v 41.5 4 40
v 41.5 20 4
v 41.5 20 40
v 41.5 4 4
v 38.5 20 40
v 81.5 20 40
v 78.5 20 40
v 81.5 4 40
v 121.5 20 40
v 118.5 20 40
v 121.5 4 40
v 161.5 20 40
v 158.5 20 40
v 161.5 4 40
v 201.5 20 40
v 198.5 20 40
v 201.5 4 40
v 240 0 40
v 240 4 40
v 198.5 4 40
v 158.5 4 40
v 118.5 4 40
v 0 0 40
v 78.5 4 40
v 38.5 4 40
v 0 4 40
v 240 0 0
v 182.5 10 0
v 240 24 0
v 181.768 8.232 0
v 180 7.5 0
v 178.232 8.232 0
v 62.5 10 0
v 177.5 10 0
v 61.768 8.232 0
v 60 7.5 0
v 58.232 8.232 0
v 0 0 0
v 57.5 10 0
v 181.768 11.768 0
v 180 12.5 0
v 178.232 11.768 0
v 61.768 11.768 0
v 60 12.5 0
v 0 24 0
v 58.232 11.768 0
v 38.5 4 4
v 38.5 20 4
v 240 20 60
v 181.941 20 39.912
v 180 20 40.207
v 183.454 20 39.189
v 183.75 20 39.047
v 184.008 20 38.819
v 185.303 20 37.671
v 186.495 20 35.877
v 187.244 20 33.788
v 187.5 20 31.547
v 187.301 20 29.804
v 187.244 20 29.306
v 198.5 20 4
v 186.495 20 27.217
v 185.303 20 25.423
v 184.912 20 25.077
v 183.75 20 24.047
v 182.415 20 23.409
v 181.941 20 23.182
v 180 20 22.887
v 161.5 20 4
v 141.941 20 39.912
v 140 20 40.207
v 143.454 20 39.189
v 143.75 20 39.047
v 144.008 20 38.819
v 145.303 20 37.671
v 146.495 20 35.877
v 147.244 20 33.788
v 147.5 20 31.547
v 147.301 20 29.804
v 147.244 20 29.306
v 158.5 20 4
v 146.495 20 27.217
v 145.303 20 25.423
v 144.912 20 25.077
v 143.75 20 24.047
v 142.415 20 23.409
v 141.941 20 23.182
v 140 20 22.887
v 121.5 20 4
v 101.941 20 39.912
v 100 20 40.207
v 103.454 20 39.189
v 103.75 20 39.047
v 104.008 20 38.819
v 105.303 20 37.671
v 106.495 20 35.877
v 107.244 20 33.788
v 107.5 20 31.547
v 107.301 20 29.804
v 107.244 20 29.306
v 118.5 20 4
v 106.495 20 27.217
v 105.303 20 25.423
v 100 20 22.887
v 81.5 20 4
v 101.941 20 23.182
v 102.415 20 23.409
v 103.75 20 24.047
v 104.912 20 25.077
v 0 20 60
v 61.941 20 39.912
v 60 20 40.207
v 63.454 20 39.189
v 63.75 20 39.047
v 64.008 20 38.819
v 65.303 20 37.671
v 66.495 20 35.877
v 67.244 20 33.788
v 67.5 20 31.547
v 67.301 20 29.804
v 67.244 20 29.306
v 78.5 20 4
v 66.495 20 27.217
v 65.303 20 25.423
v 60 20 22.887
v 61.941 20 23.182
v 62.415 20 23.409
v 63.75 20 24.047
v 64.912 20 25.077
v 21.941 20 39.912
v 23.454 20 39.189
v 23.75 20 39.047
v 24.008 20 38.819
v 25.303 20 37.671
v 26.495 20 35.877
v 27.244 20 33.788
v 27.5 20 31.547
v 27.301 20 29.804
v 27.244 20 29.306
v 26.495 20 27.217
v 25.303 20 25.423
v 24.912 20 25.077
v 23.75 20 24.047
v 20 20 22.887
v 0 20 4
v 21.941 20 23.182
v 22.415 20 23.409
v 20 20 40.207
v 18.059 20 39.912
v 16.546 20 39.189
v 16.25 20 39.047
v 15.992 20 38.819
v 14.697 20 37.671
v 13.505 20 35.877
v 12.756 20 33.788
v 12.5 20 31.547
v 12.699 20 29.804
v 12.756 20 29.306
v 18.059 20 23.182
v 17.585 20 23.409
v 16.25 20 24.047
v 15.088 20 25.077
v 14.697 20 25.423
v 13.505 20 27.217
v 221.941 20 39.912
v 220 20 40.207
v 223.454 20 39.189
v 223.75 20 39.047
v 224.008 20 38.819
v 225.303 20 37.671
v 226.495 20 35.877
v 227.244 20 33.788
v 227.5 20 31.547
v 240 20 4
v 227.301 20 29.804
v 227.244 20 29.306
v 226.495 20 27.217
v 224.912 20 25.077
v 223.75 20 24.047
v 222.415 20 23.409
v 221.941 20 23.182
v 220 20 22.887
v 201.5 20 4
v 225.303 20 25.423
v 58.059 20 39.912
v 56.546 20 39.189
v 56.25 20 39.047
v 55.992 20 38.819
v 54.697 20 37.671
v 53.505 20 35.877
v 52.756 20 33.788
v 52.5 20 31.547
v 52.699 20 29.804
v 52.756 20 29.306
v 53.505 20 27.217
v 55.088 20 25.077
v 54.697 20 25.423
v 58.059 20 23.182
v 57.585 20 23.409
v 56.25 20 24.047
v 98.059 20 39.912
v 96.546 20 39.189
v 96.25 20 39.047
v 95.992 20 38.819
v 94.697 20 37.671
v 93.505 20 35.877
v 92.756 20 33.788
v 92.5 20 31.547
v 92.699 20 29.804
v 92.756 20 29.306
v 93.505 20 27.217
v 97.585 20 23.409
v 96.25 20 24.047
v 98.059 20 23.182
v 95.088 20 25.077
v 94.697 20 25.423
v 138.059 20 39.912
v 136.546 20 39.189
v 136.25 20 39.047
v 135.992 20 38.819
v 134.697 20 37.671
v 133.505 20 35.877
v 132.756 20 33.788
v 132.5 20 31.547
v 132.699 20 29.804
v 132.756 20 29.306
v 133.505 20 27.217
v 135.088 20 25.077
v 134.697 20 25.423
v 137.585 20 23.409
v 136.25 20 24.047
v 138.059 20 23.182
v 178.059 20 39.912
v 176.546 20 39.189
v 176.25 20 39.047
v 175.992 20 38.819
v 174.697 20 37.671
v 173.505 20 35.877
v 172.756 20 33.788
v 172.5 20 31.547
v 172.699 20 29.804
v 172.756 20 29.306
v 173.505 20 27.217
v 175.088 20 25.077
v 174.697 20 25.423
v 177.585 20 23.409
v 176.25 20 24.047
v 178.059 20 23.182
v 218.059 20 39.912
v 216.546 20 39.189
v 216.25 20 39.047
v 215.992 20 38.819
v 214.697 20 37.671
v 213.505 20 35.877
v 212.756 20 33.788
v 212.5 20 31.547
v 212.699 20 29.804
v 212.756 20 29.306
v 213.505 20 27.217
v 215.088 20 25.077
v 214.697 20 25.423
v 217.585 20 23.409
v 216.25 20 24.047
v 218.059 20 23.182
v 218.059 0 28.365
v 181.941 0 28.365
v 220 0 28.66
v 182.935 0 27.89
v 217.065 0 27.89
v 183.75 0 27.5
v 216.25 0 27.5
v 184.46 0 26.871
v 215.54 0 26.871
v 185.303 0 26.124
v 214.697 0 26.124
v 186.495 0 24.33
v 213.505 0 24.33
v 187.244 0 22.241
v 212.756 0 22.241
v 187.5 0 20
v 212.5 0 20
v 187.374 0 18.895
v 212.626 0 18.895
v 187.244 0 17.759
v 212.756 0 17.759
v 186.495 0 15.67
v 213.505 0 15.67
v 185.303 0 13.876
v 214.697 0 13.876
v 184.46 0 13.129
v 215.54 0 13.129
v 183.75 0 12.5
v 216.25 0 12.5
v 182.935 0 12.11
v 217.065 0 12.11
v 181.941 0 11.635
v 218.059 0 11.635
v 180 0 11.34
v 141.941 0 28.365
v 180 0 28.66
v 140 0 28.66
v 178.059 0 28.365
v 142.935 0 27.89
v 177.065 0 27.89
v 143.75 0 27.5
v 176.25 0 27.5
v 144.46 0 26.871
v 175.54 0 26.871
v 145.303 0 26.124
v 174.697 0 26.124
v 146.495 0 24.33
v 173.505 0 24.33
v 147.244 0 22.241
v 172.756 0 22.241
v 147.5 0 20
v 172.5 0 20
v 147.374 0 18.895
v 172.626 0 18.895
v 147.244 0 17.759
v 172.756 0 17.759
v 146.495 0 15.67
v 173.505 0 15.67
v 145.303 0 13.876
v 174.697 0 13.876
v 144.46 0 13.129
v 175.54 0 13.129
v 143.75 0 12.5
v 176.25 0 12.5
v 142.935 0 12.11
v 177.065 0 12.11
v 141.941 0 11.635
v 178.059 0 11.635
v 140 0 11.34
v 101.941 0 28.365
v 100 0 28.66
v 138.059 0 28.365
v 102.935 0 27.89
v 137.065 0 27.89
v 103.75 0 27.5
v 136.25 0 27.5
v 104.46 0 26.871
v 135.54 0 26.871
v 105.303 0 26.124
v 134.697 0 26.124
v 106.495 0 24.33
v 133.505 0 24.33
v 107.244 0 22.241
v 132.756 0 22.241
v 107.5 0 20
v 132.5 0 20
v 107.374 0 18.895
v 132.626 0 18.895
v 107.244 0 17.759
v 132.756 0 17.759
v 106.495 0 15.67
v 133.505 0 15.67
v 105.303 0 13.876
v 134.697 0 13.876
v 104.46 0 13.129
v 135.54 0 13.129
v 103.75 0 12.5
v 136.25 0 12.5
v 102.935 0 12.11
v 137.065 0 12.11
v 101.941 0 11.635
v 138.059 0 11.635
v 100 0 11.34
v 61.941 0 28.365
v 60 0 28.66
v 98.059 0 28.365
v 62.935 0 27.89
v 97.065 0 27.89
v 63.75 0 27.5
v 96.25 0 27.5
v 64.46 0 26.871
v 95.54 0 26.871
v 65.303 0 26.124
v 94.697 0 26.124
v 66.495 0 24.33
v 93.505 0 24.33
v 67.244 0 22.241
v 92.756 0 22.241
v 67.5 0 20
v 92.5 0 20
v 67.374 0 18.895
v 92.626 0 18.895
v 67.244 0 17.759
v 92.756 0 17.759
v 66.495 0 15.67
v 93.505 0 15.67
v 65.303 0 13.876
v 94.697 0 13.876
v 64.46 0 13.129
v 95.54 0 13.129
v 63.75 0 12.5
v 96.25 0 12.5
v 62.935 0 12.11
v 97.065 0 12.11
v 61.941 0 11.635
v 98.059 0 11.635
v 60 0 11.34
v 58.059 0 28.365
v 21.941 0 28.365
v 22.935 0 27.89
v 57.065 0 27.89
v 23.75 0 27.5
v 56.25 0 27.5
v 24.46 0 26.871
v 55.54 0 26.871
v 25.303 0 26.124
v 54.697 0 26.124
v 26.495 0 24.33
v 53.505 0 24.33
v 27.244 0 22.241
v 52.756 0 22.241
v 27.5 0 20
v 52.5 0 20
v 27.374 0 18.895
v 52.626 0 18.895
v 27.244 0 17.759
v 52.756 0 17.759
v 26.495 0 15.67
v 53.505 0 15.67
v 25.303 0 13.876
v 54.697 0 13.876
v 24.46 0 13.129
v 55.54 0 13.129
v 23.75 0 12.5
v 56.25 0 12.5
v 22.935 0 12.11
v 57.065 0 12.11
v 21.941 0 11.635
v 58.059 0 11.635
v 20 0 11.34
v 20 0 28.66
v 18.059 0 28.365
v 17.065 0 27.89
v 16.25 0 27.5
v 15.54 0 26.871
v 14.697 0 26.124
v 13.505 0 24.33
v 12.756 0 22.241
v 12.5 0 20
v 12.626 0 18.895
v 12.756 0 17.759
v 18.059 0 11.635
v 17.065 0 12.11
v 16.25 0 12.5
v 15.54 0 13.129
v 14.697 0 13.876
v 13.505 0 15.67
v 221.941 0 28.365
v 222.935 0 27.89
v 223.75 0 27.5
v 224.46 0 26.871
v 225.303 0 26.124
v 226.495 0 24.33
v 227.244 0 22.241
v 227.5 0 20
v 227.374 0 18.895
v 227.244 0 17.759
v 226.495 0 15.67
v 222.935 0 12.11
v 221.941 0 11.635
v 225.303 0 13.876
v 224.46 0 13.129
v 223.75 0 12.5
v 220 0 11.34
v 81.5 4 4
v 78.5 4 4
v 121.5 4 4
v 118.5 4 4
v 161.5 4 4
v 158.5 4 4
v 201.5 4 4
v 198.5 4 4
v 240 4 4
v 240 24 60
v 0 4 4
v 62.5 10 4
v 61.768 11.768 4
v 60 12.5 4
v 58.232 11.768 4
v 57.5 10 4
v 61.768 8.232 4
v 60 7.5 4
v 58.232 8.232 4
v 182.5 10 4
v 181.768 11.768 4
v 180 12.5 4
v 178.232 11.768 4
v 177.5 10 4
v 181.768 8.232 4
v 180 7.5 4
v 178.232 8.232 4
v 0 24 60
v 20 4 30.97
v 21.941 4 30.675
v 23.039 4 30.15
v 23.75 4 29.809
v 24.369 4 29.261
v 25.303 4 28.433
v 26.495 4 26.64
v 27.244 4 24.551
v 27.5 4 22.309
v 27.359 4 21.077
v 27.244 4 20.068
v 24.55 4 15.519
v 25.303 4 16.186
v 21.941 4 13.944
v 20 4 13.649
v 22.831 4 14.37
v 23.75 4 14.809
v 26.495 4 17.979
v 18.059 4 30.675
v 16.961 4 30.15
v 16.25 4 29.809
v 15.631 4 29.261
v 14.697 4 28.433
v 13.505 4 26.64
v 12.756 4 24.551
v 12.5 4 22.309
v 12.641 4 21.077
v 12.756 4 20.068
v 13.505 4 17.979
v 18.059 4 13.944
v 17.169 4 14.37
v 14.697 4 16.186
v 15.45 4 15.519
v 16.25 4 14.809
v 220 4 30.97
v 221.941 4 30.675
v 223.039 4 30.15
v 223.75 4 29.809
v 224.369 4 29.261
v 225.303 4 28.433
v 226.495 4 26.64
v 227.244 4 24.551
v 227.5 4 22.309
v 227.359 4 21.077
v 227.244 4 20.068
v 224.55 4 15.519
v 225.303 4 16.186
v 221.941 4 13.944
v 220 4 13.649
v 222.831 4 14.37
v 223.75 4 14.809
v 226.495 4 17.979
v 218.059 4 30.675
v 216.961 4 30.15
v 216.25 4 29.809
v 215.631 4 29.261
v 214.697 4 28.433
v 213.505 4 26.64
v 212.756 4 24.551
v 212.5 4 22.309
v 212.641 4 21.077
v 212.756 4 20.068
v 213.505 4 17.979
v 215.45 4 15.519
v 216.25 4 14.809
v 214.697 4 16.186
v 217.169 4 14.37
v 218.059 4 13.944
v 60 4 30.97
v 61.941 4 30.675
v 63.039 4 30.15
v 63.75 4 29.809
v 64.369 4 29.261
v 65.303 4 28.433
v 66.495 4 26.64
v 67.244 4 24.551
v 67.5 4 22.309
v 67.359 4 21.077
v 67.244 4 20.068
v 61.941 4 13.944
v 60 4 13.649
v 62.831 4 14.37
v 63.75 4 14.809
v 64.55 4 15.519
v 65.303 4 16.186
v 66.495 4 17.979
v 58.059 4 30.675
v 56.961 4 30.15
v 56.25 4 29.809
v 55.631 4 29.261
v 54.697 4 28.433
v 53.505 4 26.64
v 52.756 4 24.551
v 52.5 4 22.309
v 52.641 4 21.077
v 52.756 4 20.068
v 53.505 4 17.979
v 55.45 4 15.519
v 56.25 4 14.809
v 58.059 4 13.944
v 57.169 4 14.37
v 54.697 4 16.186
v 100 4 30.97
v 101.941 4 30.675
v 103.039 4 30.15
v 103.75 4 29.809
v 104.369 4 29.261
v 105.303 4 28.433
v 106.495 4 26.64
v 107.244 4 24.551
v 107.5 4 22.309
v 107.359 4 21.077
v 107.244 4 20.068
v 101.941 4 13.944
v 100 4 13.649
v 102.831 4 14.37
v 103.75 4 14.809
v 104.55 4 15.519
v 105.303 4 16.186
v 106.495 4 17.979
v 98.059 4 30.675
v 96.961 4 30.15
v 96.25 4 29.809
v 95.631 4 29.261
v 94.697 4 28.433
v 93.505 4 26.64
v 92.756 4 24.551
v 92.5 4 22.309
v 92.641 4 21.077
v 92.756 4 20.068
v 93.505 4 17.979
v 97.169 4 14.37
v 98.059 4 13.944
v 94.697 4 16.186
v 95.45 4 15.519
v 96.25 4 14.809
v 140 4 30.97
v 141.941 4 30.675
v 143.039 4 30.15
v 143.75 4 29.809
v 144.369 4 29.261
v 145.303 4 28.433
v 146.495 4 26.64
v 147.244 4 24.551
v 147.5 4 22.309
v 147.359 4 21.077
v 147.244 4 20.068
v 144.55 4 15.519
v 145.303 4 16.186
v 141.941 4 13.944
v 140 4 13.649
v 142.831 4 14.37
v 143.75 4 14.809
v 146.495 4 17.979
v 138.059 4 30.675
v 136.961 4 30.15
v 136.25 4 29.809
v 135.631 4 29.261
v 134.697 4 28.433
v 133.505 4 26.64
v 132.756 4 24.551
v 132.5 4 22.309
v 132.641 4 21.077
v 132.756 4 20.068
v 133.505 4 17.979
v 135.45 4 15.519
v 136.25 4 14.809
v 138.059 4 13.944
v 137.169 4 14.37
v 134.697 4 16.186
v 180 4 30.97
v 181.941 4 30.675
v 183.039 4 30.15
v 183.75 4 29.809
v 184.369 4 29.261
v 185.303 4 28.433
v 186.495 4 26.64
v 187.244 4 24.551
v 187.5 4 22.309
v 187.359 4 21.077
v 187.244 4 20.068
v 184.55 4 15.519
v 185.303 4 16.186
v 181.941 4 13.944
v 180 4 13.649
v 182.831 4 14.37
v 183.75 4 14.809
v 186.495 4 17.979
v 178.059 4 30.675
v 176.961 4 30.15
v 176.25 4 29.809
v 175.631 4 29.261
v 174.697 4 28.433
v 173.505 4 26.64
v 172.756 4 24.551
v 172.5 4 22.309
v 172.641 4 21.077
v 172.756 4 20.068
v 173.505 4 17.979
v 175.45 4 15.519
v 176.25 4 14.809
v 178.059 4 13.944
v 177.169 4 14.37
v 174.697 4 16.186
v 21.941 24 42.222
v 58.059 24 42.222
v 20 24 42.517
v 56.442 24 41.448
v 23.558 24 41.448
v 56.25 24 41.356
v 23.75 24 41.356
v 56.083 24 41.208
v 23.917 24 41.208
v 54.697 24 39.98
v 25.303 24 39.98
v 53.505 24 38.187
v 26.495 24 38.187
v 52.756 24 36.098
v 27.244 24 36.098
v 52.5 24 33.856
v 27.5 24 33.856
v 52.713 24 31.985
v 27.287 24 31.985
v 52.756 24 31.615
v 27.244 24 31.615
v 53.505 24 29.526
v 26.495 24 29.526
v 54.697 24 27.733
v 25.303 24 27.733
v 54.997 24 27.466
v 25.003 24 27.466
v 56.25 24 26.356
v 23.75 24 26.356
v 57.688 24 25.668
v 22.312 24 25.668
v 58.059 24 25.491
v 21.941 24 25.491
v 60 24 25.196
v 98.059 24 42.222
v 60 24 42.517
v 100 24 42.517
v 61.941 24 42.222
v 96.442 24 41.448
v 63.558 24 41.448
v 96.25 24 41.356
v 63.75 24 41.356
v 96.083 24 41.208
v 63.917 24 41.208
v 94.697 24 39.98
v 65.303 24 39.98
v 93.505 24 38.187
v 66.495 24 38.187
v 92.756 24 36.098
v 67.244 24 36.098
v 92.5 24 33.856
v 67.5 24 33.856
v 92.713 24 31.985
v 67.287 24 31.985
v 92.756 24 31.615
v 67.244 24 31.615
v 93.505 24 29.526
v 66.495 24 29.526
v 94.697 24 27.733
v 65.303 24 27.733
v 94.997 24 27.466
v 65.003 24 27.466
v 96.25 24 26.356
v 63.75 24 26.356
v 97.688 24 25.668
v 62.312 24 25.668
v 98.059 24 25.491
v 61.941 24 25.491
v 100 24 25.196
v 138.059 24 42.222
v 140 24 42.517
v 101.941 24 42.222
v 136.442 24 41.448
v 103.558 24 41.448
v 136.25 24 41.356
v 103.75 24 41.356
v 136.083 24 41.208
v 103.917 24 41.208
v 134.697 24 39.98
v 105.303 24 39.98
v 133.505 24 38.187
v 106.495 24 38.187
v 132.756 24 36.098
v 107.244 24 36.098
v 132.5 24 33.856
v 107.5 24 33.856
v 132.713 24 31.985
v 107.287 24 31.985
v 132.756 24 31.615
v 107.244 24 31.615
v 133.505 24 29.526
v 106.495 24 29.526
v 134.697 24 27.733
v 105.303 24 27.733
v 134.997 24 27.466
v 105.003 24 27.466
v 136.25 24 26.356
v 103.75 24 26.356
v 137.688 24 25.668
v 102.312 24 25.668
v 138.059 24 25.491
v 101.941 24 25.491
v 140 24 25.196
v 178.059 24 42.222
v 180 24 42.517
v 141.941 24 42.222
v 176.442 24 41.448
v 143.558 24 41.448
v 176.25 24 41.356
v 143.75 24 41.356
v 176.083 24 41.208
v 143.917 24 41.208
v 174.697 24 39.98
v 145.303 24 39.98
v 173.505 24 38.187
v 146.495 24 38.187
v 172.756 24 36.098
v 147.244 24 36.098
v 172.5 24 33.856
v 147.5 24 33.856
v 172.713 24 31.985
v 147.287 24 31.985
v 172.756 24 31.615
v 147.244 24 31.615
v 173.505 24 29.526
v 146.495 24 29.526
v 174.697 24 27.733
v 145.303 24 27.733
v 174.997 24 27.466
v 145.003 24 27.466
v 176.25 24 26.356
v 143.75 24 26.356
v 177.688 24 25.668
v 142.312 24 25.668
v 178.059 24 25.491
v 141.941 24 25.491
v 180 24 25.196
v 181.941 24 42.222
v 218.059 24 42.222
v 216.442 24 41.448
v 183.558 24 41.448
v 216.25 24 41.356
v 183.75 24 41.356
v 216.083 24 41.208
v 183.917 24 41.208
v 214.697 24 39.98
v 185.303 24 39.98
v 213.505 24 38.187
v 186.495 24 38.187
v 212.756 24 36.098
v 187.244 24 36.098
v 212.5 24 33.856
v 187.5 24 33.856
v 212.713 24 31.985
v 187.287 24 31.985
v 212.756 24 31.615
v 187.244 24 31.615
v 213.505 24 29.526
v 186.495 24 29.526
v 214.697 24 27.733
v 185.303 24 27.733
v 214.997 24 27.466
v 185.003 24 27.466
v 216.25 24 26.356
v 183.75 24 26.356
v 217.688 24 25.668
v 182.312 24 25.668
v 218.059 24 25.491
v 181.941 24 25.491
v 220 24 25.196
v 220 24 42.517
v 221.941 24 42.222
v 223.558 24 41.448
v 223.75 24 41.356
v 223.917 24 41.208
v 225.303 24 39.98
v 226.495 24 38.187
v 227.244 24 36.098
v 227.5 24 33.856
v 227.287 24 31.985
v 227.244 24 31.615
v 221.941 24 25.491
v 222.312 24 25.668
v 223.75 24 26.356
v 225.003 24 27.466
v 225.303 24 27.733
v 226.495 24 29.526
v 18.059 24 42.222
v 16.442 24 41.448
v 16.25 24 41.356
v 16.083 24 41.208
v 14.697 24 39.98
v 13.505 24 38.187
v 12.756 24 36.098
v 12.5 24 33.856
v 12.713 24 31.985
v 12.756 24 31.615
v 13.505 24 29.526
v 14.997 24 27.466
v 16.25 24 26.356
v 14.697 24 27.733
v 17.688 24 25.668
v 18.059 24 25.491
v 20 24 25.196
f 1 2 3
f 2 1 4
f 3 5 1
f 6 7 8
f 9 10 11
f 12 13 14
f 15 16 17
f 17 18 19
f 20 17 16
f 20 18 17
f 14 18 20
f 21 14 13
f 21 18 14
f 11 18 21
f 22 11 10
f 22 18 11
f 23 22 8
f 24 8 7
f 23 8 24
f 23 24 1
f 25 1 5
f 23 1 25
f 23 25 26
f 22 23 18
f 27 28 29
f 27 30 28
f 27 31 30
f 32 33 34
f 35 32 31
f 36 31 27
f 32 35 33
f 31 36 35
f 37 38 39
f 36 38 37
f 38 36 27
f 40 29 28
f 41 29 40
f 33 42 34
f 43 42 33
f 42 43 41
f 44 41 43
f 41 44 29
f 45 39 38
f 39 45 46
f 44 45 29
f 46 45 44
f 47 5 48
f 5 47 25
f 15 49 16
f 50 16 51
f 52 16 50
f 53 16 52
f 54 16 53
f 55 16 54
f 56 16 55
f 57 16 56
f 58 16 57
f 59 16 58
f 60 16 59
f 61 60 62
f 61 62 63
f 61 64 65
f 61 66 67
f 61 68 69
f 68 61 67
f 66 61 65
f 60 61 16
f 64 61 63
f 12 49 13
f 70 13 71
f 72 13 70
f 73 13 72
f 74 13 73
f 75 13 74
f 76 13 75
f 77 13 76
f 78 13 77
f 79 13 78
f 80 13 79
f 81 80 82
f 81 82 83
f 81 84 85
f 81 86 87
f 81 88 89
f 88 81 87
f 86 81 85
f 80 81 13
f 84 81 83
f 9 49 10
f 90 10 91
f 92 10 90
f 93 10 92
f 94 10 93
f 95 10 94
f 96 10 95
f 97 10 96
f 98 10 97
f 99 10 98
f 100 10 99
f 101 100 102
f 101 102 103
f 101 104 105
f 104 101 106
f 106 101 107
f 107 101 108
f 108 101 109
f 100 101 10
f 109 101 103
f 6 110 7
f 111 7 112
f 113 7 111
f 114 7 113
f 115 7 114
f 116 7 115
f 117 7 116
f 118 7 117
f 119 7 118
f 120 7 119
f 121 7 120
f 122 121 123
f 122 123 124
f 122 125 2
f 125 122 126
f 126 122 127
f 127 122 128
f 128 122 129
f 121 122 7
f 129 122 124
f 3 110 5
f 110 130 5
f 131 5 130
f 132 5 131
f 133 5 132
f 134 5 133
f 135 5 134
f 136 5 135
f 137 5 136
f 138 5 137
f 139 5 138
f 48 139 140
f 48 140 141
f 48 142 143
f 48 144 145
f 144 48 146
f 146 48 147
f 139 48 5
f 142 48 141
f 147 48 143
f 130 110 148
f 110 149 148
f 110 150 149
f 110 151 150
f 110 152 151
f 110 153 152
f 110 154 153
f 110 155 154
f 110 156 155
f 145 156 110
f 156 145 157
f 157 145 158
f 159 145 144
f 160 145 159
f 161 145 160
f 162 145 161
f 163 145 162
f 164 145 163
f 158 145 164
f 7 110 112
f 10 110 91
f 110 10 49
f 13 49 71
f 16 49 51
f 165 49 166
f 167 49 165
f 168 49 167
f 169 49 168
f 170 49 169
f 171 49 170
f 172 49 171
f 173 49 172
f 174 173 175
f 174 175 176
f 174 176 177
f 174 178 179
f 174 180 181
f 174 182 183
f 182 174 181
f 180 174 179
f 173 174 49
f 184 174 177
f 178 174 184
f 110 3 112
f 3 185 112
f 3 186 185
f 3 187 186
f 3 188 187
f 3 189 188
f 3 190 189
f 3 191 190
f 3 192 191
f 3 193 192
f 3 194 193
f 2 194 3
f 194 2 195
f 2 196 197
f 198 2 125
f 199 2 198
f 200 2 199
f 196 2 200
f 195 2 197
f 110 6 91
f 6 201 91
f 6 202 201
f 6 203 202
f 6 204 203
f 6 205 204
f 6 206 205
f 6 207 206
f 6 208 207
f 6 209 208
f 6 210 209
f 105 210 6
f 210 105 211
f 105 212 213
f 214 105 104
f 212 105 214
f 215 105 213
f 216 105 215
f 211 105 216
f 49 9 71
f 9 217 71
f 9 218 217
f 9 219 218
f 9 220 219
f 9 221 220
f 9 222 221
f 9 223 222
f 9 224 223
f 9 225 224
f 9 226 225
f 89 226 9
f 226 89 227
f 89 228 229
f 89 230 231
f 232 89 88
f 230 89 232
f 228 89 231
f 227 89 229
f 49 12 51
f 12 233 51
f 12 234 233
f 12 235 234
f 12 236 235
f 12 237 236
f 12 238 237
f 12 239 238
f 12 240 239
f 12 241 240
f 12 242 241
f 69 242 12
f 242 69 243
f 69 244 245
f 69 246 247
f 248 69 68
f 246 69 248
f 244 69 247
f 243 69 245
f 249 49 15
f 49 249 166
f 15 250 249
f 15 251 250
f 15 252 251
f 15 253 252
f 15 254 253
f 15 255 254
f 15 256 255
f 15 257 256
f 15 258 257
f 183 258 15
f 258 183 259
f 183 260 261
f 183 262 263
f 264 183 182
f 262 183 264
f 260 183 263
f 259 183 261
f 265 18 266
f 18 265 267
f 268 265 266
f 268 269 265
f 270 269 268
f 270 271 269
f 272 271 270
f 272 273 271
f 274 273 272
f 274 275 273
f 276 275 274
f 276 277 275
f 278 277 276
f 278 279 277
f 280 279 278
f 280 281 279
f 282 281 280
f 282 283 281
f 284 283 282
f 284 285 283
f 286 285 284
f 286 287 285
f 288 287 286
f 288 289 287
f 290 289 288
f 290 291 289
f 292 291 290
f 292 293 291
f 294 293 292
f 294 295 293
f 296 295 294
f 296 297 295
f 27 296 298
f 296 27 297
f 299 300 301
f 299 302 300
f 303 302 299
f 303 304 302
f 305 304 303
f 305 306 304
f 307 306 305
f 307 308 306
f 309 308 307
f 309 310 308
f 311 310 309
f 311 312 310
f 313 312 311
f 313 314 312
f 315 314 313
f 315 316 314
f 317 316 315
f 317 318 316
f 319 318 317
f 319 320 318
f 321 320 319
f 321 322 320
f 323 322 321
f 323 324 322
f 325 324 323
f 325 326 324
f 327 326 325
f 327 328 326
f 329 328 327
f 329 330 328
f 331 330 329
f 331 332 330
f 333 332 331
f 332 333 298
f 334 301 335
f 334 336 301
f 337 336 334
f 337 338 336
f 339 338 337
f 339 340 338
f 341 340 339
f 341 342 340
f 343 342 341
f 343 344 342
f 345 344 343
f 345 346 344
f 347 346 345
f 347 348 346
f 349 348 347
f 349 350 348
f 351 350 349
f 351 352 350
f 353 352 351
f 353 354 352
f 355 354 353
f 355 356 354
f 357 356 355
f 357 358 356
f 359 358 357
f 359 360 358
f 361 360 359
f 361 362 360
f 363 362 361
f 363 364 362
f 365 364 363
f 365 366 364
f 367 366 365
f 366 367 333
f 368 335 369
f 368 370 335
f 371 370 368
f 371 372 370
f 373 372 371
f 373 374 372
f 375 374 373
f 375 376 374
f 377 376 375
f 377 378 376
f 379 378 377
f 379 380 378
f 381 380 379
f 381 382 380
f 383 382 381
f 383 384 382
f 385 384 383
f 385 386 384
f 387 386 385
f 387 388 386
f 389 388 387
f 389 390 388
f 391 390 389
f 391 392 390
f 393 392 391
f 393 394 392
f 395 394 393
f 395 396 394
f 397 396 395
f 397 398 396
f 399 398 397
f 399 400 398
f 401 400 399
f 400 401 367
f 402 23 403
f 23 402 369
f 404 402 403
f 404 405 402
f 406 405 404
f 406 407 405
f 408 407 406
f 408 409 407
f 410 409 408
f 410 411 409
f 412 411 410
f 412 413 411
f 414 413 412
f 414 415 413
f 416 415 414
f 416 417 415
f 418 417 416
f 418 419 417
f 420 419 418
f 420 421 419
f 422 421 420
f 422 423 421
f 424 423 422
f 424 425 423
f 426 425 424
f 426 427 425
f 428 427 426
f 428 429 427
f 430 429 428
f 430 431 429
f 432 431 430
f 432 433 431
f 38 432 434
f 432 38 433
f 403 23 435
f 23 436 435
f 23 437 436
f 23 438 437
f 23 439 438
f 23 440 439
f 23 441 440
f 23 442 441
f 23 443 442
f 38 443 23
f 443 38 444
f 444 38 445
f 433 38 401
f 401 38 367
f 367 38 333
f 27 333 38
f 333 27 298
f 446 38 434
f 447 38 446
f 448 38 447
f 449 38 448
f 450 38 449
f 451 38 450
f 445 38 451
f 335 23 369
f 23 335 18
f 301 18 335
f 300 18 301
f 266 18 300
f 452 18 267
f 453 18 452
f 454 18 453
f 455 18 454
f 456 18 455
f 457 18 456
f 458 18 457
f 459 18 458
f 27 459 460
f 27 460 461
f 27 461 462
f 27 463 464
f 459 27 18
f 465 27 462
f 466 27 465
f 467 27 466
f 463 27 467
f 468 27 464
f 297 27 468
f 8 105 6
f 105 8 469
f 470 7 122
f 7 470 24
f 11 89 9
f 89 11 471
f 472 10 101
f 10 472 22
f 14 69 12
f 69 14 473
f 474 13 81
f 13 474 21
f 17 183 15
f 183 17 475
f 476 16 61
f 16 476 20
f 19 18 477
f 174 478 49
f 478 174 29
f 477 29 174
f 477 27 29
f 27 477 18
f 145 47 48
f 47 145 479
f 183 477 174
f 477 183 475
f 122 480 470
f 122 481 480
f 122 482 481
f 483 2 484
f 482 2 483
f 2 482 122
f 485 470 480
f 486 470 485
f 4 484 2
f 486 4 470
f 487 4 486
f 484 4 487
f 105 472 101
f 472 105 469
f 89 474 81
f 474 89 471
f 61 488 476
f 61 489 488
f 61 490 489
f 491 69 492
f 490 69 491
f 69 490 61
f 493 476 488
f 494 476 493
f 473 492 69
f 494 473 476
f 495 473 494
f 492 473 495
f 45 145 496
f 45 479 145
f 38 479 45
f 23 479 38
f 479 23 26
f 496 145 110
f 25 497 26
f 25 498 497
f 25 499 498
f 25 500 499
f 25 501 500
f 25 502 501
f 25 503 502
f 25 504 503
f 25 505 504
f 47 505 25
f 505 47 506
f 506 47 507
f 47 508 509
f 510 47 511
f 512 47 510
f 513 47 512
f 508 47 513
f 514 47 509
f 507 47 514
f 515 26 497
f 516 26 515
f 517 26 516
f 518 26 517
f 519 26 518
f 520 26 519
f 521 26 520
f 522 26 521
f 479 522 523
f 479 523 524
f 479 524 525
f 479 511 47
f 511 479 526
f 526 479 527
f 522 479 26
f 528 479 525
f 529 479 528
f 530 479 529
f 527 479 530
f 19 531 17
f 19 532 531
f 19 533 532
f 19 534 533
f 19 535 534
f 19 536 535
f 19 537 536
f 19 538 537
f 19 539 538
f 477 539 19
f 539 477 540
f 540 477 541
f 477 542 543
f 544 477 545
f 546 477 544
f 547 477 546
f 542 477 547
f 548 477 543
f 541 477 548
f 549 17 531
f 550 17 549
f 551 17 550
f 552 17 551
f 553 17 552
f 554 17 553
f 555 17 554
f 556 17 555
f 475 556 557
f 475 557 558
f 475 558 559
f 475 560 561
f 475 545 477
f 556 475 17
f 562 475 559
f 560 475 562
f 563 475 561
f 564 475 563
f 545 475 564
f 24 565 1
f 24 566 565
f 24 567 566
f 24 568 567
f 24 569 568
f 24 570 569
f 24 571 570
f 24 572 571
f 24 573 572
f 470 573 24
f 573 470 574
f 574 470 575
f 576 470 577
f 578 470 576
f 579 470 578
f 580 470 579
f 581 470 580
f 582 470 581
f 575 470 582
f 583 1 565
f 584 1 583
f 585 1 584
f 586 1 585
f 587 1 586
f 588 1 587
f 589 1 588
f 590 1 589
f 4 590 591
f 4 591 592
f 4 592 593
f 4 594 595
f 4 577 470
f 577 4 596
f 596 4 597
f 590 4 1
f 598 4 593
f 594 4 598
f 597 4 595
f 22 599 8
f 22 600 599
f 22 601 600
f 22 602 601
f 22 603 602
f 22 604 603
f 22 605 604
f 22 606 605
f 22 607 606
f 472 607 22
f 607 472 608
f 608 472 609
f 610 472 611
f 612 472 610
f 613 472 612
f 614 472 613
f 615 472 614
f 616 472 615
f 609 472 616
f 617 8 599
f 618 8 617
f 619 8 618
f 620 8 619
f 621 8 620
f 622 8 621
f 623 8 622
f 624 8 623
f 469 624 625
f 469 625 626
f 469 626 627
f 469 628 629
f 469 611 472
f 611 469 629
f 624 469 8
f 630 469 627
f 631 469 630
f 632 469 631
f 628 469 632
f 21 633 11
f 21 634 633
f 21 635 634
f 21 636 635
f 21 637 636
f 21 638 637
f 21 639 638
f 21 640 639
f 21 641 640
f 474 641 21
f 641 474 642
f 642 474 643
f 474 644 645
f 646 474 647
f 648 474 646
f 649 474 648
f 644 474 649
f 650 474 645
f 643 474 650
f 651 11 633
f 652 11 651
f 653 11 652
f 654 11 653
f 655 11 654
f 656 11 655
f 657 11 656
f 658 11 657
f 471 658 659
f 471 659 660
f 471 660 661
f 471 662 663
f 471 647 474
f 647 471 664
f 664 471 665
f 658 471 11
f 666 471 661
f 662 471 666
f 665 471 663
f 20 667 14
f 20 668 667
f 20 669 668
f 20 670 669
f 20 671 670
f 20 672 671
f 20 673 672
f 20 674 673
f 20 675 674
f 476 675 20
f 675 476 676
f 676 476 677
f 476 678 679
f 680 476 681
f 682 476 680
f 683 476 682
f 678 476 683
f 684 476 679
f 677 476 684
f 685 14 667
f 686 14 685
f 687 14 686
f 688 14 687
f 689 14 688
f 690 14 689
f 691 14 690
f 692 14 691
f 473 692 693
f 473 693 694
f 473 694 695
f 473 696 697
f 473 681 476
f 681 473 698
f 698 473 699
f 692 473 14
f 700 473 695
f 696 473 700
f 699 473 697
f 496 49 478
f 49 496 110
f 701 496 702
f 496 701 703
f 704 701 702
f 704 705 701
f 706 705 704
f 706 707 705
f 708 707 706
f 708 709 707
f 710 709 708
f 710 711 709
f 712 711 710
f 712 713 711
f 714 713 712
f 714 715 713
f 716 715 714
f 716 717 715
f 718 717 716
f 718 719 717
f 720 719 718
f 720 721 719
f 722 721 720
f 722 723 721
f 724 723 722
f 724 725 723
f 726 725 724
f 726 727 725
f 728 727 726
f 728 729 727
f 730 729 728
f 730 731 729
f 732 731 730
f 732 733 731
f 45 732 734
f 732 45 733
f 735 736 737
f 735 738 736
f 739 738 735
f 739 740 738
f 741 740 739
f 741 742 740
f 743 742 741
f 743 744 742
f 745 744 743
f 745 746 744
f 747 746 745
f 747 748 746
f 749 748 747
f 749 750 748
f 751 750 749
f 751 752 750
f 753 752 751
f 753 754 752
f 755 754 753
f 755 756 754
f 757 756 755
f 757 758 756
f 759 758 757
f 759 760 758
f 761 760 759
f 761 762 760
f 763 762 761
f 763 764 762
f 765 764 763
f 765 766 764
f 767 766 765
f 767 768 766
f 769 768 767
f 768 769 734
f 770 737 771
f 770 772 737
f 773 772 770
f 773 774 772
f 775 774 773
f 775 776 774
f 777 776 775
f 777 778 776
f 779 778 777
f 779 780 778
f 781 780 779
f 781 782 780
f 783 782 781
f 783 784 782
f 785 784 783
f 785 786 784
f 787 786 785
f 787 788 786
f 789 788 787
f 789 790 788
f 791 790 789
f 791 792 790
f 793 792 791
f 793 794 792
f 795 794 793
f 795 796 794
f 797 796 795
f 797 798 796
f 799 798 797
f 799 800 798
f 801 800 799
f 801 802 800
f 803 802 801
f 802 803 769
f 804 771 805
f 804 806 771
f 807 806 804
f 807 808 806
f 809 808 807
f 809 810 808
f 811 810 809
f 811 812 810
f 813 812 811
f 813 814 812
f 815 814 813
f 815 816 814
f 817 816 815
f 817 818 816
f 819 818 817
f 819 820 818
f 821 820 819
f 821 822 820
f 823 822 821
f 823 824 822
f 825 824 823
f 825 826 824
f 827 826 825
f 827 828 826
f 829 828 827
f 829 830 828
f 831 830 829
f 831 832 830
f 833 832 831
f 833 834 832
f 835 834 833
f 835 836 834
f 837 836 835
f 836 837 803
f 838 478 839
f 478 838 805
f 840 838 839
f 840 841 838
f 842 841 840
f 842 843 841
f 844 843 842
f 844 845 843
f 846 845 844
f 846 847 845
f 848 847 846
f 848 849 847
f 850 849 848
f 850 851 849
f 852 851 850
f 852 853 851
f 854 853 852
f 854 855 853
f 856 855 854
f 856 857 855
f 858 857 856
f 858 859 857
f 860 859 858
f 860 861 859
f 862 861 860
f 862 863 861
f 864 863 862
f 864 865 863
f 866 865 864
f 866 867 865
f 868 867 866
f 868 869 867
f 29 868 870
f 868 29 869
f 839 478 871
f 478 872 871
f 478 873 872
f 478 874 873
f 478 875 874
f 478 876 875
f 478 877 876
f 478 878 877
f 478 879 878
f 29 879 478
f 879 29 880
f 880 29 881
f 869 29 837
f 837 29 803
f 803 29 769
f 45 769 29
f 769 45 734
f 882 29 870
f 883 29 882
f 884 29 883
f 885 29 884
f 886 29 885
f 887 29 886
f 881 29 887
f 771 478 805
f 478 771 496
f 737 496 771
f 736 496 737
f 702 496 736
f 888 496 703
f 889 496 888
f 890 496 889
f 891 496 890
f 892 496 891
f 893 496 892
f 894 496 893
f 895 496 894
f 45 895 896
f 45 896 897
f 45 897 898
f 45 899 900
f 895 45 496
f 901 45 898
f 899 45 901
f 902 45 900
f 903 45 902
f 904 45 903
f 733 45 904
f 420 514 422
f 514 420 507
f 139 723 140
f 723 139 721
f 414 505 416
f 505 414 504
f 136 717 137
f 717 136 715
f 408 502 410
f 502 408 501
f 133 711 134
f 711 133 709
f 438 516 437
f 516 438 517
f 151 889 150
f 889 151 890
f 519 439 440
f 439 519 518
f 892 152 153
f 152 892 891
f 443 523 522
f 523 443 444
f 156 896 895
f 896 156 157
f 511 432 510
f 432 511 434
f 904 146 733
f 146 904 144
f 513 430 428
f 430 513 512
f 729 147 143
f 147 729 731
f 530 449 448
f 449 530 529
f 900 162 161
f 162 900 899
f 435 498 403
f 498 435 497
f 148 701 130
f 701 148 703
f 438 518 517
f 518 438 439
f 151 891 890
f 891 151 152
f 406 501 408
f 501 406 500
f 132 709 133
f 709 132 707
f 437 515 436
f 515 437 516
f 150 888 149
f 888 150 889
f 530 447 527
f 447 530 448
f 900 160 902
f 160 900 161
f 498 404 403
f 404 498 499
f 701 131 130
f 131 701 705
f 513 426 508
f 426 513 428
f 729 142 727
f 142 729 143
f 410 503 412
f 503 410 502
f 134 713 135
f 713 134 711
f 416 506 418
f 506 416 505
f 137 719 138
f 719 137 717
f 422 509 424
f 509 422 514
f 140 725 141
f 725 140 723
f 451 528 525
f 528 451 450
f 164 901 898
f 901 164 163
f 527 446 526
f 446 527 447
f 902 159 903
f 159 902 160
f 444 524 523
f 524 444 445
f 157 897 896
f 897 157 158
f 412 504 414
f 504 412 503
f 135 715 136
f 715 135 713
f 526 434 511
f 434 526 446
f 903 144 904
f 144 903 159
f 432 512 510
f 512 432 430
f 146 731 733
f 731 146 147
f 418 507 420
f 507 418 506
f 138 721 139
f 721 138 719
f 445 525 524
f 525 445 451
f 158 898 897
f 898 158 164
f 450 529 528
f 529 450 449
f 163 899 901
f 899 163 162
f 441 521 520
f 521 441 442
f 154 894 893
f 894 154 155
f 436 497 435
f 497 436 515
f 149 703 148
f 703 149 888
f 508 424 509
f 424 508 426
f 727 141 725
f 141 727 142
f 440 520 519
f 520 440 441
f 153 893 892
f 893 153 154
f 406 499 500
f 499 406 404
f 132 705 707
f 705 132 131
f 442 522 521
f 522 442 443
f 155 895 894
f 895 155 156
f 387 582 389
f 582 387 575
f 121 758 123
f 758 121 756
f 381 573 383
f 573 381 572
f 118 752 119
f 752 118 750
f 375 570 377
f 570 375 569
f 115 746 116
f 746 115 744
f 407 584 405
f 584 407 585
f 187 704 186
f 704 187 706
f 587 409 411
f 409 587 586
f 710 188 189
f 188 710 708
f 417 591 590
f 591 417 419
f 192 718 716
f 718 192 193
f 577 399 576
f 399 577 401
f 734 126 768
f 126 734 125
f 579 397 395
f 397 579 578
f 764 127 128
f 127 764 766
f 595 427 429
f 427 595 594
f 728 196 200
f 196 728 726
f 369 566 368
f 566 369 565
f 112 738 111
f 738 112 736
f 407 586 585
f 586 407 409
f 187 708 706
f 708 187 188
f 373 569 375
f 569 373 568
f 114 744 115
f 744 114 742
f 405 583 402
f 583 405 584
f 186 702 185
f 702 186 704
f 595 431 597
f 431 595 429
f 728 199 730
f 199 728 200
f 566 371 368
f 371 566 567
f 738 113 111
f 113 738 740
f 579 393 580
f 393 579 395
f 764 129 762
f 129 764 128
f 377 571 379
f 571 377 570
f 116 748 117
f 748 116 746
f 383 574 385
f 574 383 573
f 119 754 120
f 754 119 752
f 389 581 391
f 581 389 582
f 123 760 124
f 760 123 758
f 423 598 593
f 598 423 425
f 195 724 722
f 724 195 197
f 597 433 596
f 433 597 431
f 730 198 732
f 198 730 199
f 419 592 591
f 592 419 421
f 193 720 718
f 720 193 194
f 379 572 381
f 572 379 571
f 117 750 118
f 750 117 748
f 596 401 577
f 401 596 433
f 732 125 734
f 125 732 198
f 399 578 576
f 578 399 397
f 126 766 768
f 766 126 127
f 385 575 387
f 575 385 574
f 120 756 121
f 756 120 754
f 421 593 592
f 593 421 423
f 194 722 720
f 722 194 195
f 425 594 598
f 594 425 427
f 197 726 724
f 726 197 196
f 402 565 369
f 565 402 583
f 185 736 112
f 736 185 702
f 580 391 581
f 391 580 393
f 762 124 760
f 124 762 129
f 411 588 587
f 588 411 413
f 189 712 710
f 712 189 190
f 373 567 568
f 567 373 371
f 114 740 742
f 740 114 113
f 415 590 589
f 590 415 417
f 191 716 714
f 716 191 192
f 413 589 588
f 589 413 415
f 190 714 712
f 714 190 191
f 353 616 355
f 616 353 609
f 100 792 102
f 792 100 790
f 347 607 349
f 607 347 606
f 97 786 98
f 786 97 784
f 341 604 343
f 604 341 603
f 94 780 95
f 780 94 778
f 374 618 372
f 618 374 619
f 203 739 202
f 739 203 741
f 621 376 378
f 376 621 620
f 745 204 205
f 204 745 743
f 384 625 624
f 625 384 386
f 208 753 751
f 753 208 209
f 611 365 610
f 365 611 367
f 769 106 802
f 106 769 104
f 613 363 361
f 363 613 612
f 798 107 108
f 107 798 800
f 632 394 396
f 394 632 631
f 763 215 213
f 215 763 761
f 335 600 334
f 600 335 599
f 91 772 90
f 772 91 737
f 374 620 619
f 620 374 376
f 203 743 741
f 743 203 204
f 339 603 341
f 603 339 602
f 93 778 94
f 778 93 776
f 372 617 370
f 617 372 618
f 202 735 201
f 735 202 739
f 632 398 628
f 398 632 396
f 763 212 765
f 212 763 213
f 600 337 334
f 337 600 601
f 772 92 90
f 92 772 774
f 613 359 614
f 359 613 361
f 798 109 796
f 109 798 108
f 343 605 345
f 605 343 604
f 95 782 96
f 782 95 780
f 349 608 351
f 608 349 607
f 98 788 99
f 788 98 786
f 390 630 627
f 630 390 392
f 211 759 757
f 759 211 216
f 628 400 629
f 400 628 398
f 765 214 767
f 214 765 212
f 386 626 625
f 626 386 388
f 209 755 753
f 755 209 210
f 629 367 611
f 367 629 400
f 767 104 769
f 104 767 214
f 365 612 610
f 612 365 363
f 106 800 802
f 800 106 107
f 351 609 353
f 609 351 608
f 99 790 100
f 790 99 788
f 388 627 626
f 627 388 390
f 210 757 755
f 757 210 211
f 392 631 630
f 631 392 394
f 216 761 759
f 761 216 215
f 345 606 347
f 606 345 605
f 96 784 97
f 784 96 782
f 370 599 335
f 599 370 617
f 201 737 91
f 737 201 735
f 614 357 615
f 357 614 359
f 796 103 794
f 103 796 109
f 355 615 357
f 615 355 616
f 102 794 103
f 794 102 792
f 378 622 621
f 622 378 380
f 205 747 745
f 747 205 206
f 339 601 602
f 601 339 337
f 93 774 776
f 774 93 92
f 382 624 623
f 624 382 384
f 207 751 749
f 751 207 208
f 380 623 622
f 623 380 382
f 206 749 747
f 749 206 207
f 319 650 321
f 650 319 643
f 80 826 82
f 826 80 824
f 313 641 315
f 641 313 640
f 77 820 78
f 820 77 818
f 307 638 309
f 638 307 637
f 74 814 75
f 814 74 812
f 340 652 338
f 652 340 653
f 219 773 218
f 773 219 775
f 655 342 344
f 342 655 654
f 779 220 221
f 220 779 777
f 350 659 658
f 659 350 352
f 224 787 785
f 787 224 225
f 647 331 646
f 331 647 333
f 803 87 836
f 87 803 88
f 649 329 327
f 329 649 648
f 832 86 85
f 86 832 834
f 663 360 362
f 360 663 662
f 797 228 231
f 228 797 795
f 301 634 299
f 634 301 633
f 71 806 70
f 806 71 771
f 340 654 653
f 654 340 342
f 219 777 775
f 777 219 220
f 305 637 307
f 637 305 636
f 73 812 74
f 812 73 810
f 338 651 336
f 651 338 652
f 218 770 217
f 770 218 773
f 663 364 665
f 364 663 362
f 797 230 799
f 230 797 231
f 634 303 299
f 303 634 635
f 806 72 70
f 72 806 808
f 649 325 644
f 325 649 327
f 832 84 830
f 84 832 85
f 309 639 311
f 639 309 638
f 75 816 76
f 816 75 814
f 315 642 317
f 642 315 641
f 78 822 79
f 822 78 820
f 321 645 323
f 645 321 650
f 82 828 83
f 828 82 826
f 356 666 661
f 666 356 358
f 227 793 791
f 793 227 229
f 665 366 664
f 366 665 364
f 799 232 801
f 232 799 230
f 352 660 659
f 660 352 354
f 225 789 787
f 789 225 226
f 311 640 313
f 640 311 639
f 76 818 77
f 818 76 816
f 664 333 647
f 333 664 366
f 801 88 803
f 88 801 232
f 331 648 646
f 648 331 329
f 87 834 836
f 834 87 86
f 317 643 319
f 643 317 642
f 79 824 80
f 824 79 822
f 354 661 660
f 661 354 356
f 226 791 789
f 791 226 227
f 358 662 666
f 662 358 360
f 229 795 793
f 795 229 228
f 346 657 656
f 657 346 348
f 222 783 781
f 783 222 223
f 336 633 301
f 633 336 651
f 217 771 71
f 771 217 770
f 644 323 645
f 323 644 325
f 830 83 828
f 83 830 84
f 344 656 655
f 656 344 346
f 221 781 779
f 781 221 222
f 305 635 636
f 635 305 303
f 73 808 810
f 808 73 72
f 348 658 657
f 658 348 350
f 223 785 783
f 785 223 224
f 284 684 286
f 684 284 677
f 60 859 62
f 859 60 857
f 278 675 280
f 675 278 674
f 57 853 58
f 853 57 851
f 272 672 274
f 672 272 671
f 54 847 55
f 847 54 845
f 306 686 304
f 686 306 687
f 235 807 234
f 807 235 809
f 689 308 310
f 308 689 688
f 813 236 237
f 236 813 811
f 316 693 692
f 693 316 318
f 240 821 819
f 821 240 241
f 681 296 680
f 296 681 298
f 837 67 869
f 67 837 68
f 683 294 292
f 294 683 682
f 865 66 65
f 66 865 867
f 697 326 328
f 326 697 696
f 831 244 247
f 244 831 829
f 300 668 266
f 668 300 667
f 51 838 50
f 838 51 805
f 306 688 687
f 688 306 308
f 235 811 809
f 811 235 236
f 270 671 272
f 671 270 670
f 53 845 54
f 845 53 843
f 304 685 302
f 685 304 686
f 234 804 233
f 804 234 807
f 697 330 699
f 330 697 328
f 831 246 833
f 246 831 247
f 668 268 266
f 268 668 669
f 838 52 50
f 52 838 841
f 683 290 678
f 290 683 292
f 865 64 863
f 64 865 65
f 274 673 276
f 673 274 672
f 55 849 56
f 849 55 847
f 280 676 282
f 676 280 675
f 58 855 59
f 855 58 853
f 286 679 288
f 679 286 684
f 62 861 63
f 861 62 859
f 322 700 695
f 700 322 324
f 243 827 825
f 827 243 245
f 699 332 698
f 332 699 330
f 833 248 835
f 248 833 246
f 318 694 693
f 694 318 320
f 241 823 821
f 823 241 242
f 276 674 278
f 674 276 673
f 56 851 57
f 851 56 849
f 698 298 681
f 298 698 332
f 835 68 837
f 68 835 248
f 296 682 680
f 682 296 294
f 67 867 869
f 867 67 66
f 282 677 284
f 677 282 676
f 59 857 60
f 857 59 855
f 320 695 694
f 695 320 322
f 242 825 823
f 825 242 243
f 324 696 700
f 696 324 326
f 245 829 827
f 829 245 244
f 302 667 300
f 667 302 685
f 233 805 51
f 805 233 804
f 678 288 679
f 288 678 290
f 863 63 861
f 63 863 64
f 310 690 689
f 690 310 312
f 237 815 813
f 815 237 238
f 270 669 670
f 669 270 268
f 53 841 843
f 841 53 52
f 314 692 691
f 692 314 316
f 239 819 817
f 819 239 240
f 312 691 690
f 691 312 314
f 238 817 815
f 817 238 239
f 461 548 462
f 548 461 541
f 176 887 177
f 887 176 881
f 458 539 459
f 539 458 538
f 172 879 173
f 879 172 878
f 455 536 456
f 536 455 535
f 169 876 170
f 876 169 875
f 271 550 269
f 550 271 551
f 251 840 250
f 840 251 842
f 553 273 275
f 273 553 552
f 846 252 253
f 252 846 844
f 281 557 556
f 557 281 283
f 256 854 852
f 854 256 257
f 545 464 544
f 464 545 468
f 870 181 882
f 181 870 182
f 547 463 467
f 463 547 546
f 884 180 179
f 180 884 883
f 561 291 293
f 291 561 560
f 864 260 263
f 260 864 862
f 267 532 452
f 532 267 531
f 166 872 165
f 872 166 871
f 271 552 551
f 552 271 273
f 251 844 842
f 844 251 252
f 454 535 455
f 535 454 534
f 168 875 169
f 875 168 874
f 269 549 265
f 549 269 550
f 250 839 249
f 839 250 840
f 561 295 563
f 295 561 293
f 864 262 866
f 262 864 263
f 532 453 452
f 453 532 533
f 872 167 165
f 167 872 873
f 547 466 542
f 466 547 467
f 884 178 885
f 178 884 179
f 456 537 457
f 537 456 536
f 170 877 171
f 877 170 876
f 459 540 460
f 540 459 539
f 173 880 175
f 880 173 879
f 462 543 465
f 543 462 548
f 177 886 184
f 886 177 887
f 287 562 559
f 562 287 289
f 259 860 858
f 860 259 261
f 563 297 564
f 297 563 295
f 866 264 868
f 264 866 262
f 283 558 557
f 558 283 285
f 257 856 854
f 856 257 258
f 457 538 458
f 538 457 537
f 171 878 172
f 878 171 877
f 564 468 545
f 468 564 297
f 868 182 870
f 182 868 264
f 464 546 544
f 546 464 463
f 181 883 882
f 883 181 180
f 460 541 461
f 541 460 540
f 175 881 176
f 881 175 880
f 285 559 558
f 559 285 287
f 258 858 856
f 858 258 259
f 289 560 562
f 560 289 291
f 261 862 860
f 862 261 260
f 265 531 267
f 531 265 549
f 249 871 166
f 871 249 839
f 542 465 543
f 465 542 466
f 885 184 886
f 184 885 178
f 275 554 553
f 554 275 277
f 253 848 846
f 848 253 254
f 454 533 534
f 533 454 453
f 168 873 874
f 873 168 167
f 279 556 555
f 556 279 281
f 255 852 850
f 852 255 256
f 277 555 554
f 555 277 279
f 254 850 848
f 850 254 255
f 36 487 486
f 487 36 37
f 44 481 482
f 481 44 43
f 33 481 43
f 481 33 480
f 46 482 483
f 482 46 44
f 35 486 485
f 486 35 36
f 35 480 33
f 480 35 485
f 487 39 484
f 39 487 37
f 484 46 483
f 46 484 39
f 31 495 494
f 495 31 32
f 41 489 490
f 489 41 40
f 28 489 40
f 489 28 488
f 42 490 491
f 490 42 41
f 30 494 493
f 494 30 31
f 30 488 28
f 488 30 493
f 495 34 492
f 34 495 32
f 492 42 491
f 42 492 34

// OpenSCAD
difference() {
    union() {
        cube([240,20, 4]);
        cube([240, 4, 40]);
        translate([0, 20, 0]) {
            cube([240, 4, 60]);
        }
        for (i = [40 : 40 : 200]) { 
            translate([i - 1.5, 0, 0]) {
                cube([3, 20, 40]);
            }
        }
    }
    for (i = [20 : 40 : 220]) {
        translate([i, 0, 20]) {
            rotate([120, 0, 0]) {
                cylinder(80, d = 15, center = true);
            }
        }
    }
    translate([60, 10, 0]) {
        cylinder(20, d = 5, center = true);
    }
    translate([240 - 60, 10, 0]) {
        cylinder(20, d = 5, center = true);
    }
}
